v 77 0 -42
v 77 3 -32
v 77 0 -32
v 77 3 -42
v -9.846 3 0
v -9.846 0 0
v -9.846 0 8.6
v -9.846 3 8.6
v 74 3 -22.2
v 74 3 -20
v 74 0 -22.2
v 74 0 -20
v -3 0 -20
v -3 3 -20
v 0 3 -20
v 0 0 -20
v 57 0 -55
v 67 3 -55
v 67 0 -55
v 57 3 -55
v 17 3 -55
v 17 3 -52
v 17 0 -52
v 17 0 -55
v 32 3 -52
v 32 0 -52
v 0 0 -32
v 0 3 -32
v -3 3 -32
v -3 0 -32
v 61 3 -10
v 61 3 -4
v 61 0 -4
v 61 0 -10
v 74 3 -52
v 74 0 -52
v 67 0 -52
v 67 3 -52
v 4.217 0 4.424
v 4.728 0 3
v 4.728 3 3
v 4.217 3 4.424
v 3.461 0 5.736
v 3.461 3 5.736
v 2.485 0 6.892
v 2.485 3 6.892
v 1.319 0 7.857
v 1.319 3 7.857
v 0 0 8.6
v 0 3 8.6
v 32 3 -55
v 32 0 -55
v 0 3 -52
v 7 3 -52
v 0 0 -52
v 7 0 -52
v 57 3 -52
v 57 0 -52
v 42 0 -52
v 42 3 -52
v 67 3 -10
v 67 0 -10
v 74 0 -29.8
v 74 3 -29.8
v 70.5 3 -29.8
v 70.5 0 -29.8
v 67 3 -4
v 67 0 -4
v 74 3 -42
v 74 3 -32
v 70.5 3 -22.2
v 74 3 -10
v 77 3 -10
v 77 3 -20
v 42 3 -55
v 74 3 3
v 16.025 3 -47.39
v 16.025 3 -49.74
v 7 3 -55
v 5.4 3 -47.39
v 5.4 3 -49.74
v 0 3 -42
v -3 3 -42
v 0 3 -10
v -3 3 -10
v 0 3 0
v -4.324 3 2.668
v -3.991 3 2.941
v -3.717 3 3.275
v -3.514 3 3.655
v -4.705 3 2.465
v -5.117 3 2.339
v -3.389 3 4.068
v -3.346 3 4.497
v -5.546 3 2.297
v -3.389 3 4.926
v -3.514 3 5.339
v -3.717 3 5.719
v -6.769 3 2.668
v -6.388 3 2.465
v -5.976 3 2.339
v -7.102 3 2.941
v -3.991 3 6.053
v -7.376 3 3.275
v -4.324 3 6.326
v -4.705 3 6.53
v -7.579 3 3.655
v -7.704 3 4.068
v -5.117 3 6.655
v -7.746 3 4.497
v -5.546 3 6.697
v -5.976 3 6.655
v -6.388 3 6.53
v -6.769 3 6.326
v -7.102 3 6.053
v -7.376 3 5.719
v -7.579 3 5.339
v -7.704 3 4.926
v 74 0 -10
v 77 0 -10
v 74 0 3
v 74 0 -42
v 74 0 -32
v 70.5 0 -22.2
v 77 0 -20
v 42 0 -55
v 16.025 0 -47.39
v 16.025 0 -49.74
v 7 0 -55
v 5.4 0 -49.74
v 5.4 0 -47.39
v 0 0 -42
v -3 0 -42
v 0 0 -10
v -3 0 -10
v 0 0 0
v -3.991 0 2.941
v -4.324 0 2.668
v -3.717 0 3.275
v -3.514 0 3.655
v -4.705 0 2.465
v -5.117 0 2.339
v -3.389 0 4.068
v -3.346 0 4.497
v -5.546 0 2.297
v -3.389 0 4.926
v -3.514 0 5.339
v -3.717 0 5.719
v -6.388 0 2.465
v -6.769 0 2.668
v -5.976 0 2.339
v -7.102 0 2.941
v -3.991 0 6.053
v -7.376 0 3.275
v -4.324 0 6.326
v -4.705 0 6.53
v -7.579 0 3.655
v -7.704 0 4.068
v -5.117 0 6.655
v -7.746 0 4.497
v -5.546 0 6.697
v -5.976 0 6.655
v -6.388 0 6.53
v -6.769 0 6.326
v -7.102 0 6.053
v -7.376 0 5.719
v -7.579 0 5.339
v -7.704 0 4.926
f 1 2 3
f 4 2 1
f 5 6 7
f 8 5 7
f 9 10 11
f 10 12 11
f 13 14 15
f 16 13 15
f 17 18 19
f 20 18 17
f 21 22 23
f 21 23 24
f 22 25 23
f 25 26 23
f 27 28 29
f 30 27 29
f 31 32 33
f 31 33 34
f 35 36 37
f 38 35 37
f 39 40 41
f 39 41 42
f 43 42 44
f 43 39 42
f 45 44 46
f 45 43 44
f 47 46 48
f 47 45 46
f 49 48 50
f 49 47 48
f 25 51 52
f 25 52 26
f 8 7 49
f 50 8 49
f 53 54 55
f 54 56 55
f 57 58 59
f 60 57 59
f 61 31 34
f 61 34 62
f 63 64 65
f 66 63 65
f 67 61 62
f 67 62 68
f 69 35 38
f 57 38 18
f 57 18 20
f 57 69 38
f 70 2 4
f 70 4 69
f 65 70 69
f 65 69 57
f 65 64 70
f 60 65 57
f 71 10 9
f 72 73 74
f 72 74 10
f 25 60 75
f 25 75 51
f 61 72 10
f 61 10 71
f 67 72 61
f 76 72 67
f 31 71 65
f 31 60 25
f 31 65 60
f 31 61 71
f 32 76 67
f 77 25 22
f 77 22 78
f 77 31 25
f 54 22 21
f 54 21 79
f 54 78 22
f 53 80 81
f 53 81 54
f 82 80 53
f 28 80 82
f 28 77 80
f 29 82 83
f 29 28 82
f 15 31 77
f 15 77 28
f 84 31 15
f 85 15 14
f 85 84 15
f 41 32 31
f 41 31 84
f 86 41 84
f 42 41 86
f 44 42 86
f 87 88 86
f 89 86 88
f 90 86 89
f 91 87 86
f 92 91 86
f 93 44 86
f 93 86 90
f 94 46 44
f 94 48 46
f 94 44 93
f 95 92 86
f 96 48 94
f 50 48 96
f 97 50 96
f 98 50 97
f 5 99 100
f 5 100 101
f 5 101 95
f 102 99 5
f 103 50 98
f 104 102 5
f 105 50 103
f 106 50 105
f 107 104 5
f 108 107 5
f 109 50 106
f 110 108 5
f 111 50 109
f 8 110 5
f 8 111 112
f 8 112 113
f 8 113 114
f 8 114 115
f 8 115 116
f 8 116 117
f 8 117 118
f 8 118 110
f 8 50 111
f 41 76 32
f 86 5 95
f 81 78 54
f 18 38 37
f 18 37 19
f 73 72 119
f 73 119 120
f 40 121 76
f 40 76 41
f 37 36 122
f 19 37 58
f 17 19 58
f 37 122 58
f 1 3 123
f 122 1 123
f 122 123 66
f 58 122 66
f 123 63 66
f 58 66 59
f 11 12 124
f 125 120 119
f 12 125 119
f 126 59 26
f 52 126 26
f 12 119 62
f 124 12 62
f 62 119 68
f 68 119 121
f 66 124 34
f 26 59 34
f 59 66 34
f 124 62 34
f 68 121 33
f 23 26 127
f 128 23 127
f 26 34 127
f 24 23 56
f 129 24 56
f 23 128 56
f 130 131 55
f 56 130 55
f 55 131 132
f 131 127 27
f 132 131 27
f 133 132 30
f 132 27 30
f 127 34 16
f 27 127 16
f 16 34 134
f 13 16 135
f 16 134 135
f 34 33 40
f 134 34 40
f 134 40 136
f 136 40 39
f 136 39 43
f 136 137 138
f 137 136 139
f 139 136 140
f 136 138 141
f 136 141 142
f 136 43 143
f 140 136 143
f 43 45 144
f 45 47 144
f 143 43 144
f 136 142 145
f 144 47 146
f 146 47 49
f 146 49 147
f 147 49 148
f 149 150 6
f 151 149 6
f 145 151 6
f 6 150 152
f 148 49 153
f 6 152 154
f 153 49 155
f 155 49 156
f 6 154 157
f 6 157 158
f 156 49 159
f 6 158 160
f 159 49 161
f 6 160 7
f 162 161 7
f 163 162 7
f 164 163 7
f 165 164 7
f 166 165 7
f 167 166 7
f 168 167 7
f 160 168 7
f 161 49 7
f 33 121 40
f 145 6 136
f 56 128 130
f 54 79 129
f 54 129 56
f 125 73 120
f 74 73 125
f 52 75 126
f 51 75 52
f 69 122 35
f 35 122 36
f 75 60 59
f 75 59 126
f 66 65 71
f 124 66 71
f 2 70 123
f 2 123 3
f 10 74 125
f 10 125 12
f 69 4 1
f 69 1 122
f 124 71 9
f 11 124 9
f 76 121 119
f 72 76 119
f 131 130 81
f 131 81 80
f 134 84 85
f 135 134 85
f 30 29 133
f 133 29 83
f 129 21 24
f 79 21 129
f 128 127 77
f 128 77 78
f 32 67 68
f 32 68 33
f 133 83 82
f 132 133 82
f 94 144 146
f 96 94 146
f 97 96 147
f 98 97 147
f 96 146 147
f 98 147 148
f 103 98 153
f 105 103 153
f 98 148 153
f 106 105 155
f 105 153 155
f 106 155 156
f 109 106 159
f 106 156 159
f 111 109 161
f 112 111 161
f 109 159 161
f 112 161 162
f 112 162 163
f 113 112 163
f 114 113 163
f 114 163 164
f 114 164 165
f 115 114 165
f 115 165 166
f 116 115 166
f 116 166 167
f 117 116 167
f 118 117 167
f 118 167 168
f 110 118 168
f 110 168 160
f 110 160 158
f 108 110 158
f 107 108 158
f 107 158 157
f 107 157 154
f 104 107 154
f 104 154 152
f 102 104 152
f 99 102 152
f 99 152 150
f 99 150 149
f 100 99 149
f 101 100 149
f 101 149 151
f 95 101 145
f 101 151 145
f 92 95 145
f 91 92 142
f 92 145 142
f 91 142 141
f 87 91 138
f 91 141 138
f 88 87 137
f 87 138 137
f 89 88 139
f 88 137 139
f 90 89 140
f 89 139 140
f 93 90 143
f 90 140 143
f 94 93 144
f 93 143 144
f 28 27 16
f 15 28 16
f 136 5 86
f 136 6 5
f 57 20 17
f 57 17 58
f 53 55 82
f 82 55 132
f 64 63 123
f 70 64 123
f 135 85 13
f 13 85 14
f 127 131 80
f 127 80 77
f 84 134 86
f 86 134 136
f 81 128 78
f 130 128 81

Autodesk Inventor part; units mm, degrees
ref_plane "YZ Plane" through (0, 0, 0) normal (1, 0, 0) x (0, 1, 0)
ref_plane "XZ Plane" through (0, 0, 0) normal (0, 1, 0) x (-1, 0, 0)
ref_plane "XY Plane" through (0, 0, 0) normal (0, 0, 1) x (1, 0, 0)
sketch "Esboço1" plane through (0, 0, 0) normal (0, 1, 0) x (-1, 0, 0)
  line L0 (0, 0) -> (-74, 0)
  line L1 (-74, 0) -> (-74, -52)
  line L2 (-74, -52) -> (0, -52)
  line L3 (0, -52) -> (0, 0)
  line L4 (-6.0465, -39.0348) -> (-22.7965, -39.0348)
  line L5 (-22.7965, -39.0348) -> (-22.7965, -36.6698)
  line L6 (-22.7965, -36.6698) -> (-6.0465, -36.6698)
  line L7 (-6.0465, -36.6698) -> (-6.0465, -39.0348)
  dimension "d0" = 74
  dimension "d1" = 52
  dimension "d22" = 16.75
  dimension "d23" = 2.365
extrude "Extrusão1" add sketch "Esboço1" along normal blind 3 contours L3 L2 L1 L0 | L4 L5 L6 L7
sketch "Esboço2" plane through (0, 3, 0) normal (0, 1, 0) x (1, 0, 0)
  line L0 (0, 0) -> (74, 0) projected
  line L1 (0, 52) -> (0, 0) projected
  line L2 (74, 52) -> (0, 52) projected
  line L3 (7, 52) -> (17, 52)
  line L4 (17, 52) -> (17, 55)
  line L5 (17, 55) -> (7, 55)
  line L6 (7, 55) -> (7, 52)
  line L7 (32, 52) -> (42, 52)
  line L8 (42, 52) -> (42, 55)
  line L9 (42, 55) -> (32, 55)
  line L10 (32, 55) -> (32, 52)
  line L11 (57, 52) -> (67, 52)
  line L12 (67, 52) -> (67, 55)
  line L13 (67, 55) -> (57, 55)
  line L14 (57, 55) -> (57, 52)
  line L15 (74, 0) -> (74, 52) projected
  point P0 (17, 52)
  point P1 (67, 52)
  point P2 (42, 52)
  point P3 (74, 26)
  point P4 (32, 53.5)
  point P5 (17, 53.5)
  point P6 (7, 53.5)
  point P7 (67, 53.5)
  point P8 (42, 53.5)
  point P9 (57, 53.5)
  dimension "d13" = 3
  dimension "d40" = 7
  dimension "d41" = 7
  dimension "d43" = 10
  dimension "d46" = 10
  dimension "d52" = 10
  dimension "d54" = 40
  dimension "d55" = 15
extrude "Extrusão2" add sketch "Esboço2" against normal blind 3 contours L6 L5 L4 L2 | L2 L14 L13 L12 | L10 L9 L8 L2
sketch "Esboço4" plane through (0, 0, 0) normal (0, -1, 0) x (1, 0, 0)
  line L0 (16.0248, -49.74) -> (5.3998, -49.74)
  line L1 (5.3998, -49.74) -> (5.3998, -47.39)
  line L2 (5.3998, -47.39) -> (16.0248, -47.39)
  line L3 (16.0248, -47.39) -> (16.0248, -49.74)
  line L4 (7, -52) -> (0, -52) projected
  point P0 (0, 0)
  dimension "d24" = 10.625
  dimension "d25" = 2.35
  dimension "d120" = 2.26
extrude "Extrusão3" cut sketch "Esboço4" against normal blind 3
sketch "Esboço5" plane through (0, 3, 0) normal (0, 1, 0) x (1, 0, 0)
  line L0 (70.5, 22.2) -> (74, 22.2)
  line L1 (74, 22.2) -> (74, 29.8)
  line L2 (74, 29.8) -> (70.5, 29.8)
  line L3 (70.5, 29.8) -> (70.5, 22.2)
  line L4 (74, 0) -> (74, 52) projected
  line L5 (74, 52) -> (67, 52) projected
  point P0 (0, 0)
  point P1 (74, 26)
  point P2 (72.25, 29.8)
  dimension "d47" = 3.5
  dimension "d48" = 7.6
  dimension "d51" = 0
  dimension "d79" = 22.2
extrude "Extrusão4" cut sketch "Esboço5" against normal blind 10
sketch "Esboço6" plane through (0, 3, 0) normal (0, 1, 0) x (1, 0, 0)
  line L0 (0, 10) -> (-3, 10)
  line L1 (-3, 10) -> (-3, 20)
  line L2 (-3, 20) -> (0, 20)
  line L3 (0, 20) -> (0, 10)
  line L4 (0, 32) -> (-3, 32)
  line L5 (-3, 32) -> (-3, 42)
  line L6 (-3, 42) -> (0, 42)
  line L7 (0, 42) -> (0, 32)
  line L8 (7, 52) -> (0, 52) projected
  line L9 (0, 0) -> (74, 0) projected
  line L10 (74, 52) -> (67, 52) projected
  line L11 (0, 0) -> (74, 0) projected
  line L12 (74, 0) -> (74, 22.2) projected
  line L13 (74, 10) -> (77, 10)
  line L14 (77, 10) -> (77, 20)
  line L15 (77, 20) -> (74, 20)
  line L16 (74, 20) -> (74, 10)
  line L17 (74, 29.8) -> (74, 52) projected
  line L18 (74, 32) -> (77, 32)
  line L19 (77, 32) -> (77, 42)
  line L20 (77, 42) -> (74, 42)
  line L21 (74, 42) -> (74, 32)
  point P0 (-1.5, 42)
  point P1 (7, 0)
  point P2 (-1.5, 10)
  point P3 (67, 0)
  point P4 (75.5, 10)
  dimension "d62" = 3
  dimension "d63" = 10
  dimension "d64" = 3
  dimension "d65" = 10
  dimension "d66" = 10
  dimension "d67" = 10
  dimension "d74" = 3
  dimension "d75" = 10
  dimension "d76" = 10
extrude "Extrusão5" add sketch "Esboço6" against normal blind 3
sketch "Esboço8" plane through (0, 0, 0) normal (0, -1, 0) x (1, 0, 0)
  line L0 (0, 0) -> (74, 0) projected
  line L1 (4.9609, 0) -> (-9.8465, 0)
  line L2 (-9.8465, 0) -> (-9.8465, 8.6)
  line L3 (0, -10) -> (0, 0) projected
  circle A0 centre (-5.5465, 4.4971) radius 2.2
  line L4 (-9.8465, 8.6) -> (0, 8.6)
  line L5 (0, 8.6) -> (0, 0)
  line L6 (0, 0) -> (-9.8465, 0)
  line L7 (-9.8465, 0) -> (-9.8465, 8.6)
  arc A1 (4.9609, 0) -> (0, 8.6) centre (-3.4963, 0.8523) ccw
  point P0 (0, 4.3)
  point P1 (-4.9233, 8.6)
  dimension "d100" = 8.6
  dimension "d102" = 4.4
  dimension "d104" = 4.3
  dimension "d121" = 8.5
  dimension "d123" = 4.15
  dimension "d124" = 5.55
  dimension "d128" = 9.8465
  dimension "d130" = 9.8465
extrude "Extrusão7" add sketch "Esboço8" against normal blind 3
sketch "Esboço11" plane through (0, 0, 0) normal (0, -1, 0) x (1, 0, 0)
  line L0 (0, 0) -> (74, 0)
  line L1 (74, 0) -> (74, 3)
  line L2 (74, 3) -> (0, 3)
  line L3 (0, 3) -> (0, 0)
  dimension "d129" = 3
extrude "Extrusão9" add sketch "Esboço11" against normal blind 3
sketch "Esboço12" plane through (0, 3, 0) normal (0, 1, 0) x (1, 0, 0)
  line L0 (67, 4) -> (61, 4)
  line L1 (61, 4) -> (61, 10)
  line L2 (61, 10) -> (67, 10)
  line L3 (67, 10) -> (67, 4)
  line L4 (4.728, -3) -> (74, -3) projected
  line L5 (74, -3) -> (74, 10) projected
  line L6 (74, 10) -> (77, 10) projected
  point P0 (0, 0)
  point P1 (64, 4)
  point P2 (67, 7)
  point P3 (75.5, 10)
  dimension "d131" = 6
  dimension "d132" = 6
  dimension "d134" = 7
  dimension "d135" = 0
extrude "Extrusão10" cut sketch "Esboço12" against normal blind 10
equation "\"d55\" = -0.5 * d43 + 0.5 * d54"
properties part number "Parede_HX711"
